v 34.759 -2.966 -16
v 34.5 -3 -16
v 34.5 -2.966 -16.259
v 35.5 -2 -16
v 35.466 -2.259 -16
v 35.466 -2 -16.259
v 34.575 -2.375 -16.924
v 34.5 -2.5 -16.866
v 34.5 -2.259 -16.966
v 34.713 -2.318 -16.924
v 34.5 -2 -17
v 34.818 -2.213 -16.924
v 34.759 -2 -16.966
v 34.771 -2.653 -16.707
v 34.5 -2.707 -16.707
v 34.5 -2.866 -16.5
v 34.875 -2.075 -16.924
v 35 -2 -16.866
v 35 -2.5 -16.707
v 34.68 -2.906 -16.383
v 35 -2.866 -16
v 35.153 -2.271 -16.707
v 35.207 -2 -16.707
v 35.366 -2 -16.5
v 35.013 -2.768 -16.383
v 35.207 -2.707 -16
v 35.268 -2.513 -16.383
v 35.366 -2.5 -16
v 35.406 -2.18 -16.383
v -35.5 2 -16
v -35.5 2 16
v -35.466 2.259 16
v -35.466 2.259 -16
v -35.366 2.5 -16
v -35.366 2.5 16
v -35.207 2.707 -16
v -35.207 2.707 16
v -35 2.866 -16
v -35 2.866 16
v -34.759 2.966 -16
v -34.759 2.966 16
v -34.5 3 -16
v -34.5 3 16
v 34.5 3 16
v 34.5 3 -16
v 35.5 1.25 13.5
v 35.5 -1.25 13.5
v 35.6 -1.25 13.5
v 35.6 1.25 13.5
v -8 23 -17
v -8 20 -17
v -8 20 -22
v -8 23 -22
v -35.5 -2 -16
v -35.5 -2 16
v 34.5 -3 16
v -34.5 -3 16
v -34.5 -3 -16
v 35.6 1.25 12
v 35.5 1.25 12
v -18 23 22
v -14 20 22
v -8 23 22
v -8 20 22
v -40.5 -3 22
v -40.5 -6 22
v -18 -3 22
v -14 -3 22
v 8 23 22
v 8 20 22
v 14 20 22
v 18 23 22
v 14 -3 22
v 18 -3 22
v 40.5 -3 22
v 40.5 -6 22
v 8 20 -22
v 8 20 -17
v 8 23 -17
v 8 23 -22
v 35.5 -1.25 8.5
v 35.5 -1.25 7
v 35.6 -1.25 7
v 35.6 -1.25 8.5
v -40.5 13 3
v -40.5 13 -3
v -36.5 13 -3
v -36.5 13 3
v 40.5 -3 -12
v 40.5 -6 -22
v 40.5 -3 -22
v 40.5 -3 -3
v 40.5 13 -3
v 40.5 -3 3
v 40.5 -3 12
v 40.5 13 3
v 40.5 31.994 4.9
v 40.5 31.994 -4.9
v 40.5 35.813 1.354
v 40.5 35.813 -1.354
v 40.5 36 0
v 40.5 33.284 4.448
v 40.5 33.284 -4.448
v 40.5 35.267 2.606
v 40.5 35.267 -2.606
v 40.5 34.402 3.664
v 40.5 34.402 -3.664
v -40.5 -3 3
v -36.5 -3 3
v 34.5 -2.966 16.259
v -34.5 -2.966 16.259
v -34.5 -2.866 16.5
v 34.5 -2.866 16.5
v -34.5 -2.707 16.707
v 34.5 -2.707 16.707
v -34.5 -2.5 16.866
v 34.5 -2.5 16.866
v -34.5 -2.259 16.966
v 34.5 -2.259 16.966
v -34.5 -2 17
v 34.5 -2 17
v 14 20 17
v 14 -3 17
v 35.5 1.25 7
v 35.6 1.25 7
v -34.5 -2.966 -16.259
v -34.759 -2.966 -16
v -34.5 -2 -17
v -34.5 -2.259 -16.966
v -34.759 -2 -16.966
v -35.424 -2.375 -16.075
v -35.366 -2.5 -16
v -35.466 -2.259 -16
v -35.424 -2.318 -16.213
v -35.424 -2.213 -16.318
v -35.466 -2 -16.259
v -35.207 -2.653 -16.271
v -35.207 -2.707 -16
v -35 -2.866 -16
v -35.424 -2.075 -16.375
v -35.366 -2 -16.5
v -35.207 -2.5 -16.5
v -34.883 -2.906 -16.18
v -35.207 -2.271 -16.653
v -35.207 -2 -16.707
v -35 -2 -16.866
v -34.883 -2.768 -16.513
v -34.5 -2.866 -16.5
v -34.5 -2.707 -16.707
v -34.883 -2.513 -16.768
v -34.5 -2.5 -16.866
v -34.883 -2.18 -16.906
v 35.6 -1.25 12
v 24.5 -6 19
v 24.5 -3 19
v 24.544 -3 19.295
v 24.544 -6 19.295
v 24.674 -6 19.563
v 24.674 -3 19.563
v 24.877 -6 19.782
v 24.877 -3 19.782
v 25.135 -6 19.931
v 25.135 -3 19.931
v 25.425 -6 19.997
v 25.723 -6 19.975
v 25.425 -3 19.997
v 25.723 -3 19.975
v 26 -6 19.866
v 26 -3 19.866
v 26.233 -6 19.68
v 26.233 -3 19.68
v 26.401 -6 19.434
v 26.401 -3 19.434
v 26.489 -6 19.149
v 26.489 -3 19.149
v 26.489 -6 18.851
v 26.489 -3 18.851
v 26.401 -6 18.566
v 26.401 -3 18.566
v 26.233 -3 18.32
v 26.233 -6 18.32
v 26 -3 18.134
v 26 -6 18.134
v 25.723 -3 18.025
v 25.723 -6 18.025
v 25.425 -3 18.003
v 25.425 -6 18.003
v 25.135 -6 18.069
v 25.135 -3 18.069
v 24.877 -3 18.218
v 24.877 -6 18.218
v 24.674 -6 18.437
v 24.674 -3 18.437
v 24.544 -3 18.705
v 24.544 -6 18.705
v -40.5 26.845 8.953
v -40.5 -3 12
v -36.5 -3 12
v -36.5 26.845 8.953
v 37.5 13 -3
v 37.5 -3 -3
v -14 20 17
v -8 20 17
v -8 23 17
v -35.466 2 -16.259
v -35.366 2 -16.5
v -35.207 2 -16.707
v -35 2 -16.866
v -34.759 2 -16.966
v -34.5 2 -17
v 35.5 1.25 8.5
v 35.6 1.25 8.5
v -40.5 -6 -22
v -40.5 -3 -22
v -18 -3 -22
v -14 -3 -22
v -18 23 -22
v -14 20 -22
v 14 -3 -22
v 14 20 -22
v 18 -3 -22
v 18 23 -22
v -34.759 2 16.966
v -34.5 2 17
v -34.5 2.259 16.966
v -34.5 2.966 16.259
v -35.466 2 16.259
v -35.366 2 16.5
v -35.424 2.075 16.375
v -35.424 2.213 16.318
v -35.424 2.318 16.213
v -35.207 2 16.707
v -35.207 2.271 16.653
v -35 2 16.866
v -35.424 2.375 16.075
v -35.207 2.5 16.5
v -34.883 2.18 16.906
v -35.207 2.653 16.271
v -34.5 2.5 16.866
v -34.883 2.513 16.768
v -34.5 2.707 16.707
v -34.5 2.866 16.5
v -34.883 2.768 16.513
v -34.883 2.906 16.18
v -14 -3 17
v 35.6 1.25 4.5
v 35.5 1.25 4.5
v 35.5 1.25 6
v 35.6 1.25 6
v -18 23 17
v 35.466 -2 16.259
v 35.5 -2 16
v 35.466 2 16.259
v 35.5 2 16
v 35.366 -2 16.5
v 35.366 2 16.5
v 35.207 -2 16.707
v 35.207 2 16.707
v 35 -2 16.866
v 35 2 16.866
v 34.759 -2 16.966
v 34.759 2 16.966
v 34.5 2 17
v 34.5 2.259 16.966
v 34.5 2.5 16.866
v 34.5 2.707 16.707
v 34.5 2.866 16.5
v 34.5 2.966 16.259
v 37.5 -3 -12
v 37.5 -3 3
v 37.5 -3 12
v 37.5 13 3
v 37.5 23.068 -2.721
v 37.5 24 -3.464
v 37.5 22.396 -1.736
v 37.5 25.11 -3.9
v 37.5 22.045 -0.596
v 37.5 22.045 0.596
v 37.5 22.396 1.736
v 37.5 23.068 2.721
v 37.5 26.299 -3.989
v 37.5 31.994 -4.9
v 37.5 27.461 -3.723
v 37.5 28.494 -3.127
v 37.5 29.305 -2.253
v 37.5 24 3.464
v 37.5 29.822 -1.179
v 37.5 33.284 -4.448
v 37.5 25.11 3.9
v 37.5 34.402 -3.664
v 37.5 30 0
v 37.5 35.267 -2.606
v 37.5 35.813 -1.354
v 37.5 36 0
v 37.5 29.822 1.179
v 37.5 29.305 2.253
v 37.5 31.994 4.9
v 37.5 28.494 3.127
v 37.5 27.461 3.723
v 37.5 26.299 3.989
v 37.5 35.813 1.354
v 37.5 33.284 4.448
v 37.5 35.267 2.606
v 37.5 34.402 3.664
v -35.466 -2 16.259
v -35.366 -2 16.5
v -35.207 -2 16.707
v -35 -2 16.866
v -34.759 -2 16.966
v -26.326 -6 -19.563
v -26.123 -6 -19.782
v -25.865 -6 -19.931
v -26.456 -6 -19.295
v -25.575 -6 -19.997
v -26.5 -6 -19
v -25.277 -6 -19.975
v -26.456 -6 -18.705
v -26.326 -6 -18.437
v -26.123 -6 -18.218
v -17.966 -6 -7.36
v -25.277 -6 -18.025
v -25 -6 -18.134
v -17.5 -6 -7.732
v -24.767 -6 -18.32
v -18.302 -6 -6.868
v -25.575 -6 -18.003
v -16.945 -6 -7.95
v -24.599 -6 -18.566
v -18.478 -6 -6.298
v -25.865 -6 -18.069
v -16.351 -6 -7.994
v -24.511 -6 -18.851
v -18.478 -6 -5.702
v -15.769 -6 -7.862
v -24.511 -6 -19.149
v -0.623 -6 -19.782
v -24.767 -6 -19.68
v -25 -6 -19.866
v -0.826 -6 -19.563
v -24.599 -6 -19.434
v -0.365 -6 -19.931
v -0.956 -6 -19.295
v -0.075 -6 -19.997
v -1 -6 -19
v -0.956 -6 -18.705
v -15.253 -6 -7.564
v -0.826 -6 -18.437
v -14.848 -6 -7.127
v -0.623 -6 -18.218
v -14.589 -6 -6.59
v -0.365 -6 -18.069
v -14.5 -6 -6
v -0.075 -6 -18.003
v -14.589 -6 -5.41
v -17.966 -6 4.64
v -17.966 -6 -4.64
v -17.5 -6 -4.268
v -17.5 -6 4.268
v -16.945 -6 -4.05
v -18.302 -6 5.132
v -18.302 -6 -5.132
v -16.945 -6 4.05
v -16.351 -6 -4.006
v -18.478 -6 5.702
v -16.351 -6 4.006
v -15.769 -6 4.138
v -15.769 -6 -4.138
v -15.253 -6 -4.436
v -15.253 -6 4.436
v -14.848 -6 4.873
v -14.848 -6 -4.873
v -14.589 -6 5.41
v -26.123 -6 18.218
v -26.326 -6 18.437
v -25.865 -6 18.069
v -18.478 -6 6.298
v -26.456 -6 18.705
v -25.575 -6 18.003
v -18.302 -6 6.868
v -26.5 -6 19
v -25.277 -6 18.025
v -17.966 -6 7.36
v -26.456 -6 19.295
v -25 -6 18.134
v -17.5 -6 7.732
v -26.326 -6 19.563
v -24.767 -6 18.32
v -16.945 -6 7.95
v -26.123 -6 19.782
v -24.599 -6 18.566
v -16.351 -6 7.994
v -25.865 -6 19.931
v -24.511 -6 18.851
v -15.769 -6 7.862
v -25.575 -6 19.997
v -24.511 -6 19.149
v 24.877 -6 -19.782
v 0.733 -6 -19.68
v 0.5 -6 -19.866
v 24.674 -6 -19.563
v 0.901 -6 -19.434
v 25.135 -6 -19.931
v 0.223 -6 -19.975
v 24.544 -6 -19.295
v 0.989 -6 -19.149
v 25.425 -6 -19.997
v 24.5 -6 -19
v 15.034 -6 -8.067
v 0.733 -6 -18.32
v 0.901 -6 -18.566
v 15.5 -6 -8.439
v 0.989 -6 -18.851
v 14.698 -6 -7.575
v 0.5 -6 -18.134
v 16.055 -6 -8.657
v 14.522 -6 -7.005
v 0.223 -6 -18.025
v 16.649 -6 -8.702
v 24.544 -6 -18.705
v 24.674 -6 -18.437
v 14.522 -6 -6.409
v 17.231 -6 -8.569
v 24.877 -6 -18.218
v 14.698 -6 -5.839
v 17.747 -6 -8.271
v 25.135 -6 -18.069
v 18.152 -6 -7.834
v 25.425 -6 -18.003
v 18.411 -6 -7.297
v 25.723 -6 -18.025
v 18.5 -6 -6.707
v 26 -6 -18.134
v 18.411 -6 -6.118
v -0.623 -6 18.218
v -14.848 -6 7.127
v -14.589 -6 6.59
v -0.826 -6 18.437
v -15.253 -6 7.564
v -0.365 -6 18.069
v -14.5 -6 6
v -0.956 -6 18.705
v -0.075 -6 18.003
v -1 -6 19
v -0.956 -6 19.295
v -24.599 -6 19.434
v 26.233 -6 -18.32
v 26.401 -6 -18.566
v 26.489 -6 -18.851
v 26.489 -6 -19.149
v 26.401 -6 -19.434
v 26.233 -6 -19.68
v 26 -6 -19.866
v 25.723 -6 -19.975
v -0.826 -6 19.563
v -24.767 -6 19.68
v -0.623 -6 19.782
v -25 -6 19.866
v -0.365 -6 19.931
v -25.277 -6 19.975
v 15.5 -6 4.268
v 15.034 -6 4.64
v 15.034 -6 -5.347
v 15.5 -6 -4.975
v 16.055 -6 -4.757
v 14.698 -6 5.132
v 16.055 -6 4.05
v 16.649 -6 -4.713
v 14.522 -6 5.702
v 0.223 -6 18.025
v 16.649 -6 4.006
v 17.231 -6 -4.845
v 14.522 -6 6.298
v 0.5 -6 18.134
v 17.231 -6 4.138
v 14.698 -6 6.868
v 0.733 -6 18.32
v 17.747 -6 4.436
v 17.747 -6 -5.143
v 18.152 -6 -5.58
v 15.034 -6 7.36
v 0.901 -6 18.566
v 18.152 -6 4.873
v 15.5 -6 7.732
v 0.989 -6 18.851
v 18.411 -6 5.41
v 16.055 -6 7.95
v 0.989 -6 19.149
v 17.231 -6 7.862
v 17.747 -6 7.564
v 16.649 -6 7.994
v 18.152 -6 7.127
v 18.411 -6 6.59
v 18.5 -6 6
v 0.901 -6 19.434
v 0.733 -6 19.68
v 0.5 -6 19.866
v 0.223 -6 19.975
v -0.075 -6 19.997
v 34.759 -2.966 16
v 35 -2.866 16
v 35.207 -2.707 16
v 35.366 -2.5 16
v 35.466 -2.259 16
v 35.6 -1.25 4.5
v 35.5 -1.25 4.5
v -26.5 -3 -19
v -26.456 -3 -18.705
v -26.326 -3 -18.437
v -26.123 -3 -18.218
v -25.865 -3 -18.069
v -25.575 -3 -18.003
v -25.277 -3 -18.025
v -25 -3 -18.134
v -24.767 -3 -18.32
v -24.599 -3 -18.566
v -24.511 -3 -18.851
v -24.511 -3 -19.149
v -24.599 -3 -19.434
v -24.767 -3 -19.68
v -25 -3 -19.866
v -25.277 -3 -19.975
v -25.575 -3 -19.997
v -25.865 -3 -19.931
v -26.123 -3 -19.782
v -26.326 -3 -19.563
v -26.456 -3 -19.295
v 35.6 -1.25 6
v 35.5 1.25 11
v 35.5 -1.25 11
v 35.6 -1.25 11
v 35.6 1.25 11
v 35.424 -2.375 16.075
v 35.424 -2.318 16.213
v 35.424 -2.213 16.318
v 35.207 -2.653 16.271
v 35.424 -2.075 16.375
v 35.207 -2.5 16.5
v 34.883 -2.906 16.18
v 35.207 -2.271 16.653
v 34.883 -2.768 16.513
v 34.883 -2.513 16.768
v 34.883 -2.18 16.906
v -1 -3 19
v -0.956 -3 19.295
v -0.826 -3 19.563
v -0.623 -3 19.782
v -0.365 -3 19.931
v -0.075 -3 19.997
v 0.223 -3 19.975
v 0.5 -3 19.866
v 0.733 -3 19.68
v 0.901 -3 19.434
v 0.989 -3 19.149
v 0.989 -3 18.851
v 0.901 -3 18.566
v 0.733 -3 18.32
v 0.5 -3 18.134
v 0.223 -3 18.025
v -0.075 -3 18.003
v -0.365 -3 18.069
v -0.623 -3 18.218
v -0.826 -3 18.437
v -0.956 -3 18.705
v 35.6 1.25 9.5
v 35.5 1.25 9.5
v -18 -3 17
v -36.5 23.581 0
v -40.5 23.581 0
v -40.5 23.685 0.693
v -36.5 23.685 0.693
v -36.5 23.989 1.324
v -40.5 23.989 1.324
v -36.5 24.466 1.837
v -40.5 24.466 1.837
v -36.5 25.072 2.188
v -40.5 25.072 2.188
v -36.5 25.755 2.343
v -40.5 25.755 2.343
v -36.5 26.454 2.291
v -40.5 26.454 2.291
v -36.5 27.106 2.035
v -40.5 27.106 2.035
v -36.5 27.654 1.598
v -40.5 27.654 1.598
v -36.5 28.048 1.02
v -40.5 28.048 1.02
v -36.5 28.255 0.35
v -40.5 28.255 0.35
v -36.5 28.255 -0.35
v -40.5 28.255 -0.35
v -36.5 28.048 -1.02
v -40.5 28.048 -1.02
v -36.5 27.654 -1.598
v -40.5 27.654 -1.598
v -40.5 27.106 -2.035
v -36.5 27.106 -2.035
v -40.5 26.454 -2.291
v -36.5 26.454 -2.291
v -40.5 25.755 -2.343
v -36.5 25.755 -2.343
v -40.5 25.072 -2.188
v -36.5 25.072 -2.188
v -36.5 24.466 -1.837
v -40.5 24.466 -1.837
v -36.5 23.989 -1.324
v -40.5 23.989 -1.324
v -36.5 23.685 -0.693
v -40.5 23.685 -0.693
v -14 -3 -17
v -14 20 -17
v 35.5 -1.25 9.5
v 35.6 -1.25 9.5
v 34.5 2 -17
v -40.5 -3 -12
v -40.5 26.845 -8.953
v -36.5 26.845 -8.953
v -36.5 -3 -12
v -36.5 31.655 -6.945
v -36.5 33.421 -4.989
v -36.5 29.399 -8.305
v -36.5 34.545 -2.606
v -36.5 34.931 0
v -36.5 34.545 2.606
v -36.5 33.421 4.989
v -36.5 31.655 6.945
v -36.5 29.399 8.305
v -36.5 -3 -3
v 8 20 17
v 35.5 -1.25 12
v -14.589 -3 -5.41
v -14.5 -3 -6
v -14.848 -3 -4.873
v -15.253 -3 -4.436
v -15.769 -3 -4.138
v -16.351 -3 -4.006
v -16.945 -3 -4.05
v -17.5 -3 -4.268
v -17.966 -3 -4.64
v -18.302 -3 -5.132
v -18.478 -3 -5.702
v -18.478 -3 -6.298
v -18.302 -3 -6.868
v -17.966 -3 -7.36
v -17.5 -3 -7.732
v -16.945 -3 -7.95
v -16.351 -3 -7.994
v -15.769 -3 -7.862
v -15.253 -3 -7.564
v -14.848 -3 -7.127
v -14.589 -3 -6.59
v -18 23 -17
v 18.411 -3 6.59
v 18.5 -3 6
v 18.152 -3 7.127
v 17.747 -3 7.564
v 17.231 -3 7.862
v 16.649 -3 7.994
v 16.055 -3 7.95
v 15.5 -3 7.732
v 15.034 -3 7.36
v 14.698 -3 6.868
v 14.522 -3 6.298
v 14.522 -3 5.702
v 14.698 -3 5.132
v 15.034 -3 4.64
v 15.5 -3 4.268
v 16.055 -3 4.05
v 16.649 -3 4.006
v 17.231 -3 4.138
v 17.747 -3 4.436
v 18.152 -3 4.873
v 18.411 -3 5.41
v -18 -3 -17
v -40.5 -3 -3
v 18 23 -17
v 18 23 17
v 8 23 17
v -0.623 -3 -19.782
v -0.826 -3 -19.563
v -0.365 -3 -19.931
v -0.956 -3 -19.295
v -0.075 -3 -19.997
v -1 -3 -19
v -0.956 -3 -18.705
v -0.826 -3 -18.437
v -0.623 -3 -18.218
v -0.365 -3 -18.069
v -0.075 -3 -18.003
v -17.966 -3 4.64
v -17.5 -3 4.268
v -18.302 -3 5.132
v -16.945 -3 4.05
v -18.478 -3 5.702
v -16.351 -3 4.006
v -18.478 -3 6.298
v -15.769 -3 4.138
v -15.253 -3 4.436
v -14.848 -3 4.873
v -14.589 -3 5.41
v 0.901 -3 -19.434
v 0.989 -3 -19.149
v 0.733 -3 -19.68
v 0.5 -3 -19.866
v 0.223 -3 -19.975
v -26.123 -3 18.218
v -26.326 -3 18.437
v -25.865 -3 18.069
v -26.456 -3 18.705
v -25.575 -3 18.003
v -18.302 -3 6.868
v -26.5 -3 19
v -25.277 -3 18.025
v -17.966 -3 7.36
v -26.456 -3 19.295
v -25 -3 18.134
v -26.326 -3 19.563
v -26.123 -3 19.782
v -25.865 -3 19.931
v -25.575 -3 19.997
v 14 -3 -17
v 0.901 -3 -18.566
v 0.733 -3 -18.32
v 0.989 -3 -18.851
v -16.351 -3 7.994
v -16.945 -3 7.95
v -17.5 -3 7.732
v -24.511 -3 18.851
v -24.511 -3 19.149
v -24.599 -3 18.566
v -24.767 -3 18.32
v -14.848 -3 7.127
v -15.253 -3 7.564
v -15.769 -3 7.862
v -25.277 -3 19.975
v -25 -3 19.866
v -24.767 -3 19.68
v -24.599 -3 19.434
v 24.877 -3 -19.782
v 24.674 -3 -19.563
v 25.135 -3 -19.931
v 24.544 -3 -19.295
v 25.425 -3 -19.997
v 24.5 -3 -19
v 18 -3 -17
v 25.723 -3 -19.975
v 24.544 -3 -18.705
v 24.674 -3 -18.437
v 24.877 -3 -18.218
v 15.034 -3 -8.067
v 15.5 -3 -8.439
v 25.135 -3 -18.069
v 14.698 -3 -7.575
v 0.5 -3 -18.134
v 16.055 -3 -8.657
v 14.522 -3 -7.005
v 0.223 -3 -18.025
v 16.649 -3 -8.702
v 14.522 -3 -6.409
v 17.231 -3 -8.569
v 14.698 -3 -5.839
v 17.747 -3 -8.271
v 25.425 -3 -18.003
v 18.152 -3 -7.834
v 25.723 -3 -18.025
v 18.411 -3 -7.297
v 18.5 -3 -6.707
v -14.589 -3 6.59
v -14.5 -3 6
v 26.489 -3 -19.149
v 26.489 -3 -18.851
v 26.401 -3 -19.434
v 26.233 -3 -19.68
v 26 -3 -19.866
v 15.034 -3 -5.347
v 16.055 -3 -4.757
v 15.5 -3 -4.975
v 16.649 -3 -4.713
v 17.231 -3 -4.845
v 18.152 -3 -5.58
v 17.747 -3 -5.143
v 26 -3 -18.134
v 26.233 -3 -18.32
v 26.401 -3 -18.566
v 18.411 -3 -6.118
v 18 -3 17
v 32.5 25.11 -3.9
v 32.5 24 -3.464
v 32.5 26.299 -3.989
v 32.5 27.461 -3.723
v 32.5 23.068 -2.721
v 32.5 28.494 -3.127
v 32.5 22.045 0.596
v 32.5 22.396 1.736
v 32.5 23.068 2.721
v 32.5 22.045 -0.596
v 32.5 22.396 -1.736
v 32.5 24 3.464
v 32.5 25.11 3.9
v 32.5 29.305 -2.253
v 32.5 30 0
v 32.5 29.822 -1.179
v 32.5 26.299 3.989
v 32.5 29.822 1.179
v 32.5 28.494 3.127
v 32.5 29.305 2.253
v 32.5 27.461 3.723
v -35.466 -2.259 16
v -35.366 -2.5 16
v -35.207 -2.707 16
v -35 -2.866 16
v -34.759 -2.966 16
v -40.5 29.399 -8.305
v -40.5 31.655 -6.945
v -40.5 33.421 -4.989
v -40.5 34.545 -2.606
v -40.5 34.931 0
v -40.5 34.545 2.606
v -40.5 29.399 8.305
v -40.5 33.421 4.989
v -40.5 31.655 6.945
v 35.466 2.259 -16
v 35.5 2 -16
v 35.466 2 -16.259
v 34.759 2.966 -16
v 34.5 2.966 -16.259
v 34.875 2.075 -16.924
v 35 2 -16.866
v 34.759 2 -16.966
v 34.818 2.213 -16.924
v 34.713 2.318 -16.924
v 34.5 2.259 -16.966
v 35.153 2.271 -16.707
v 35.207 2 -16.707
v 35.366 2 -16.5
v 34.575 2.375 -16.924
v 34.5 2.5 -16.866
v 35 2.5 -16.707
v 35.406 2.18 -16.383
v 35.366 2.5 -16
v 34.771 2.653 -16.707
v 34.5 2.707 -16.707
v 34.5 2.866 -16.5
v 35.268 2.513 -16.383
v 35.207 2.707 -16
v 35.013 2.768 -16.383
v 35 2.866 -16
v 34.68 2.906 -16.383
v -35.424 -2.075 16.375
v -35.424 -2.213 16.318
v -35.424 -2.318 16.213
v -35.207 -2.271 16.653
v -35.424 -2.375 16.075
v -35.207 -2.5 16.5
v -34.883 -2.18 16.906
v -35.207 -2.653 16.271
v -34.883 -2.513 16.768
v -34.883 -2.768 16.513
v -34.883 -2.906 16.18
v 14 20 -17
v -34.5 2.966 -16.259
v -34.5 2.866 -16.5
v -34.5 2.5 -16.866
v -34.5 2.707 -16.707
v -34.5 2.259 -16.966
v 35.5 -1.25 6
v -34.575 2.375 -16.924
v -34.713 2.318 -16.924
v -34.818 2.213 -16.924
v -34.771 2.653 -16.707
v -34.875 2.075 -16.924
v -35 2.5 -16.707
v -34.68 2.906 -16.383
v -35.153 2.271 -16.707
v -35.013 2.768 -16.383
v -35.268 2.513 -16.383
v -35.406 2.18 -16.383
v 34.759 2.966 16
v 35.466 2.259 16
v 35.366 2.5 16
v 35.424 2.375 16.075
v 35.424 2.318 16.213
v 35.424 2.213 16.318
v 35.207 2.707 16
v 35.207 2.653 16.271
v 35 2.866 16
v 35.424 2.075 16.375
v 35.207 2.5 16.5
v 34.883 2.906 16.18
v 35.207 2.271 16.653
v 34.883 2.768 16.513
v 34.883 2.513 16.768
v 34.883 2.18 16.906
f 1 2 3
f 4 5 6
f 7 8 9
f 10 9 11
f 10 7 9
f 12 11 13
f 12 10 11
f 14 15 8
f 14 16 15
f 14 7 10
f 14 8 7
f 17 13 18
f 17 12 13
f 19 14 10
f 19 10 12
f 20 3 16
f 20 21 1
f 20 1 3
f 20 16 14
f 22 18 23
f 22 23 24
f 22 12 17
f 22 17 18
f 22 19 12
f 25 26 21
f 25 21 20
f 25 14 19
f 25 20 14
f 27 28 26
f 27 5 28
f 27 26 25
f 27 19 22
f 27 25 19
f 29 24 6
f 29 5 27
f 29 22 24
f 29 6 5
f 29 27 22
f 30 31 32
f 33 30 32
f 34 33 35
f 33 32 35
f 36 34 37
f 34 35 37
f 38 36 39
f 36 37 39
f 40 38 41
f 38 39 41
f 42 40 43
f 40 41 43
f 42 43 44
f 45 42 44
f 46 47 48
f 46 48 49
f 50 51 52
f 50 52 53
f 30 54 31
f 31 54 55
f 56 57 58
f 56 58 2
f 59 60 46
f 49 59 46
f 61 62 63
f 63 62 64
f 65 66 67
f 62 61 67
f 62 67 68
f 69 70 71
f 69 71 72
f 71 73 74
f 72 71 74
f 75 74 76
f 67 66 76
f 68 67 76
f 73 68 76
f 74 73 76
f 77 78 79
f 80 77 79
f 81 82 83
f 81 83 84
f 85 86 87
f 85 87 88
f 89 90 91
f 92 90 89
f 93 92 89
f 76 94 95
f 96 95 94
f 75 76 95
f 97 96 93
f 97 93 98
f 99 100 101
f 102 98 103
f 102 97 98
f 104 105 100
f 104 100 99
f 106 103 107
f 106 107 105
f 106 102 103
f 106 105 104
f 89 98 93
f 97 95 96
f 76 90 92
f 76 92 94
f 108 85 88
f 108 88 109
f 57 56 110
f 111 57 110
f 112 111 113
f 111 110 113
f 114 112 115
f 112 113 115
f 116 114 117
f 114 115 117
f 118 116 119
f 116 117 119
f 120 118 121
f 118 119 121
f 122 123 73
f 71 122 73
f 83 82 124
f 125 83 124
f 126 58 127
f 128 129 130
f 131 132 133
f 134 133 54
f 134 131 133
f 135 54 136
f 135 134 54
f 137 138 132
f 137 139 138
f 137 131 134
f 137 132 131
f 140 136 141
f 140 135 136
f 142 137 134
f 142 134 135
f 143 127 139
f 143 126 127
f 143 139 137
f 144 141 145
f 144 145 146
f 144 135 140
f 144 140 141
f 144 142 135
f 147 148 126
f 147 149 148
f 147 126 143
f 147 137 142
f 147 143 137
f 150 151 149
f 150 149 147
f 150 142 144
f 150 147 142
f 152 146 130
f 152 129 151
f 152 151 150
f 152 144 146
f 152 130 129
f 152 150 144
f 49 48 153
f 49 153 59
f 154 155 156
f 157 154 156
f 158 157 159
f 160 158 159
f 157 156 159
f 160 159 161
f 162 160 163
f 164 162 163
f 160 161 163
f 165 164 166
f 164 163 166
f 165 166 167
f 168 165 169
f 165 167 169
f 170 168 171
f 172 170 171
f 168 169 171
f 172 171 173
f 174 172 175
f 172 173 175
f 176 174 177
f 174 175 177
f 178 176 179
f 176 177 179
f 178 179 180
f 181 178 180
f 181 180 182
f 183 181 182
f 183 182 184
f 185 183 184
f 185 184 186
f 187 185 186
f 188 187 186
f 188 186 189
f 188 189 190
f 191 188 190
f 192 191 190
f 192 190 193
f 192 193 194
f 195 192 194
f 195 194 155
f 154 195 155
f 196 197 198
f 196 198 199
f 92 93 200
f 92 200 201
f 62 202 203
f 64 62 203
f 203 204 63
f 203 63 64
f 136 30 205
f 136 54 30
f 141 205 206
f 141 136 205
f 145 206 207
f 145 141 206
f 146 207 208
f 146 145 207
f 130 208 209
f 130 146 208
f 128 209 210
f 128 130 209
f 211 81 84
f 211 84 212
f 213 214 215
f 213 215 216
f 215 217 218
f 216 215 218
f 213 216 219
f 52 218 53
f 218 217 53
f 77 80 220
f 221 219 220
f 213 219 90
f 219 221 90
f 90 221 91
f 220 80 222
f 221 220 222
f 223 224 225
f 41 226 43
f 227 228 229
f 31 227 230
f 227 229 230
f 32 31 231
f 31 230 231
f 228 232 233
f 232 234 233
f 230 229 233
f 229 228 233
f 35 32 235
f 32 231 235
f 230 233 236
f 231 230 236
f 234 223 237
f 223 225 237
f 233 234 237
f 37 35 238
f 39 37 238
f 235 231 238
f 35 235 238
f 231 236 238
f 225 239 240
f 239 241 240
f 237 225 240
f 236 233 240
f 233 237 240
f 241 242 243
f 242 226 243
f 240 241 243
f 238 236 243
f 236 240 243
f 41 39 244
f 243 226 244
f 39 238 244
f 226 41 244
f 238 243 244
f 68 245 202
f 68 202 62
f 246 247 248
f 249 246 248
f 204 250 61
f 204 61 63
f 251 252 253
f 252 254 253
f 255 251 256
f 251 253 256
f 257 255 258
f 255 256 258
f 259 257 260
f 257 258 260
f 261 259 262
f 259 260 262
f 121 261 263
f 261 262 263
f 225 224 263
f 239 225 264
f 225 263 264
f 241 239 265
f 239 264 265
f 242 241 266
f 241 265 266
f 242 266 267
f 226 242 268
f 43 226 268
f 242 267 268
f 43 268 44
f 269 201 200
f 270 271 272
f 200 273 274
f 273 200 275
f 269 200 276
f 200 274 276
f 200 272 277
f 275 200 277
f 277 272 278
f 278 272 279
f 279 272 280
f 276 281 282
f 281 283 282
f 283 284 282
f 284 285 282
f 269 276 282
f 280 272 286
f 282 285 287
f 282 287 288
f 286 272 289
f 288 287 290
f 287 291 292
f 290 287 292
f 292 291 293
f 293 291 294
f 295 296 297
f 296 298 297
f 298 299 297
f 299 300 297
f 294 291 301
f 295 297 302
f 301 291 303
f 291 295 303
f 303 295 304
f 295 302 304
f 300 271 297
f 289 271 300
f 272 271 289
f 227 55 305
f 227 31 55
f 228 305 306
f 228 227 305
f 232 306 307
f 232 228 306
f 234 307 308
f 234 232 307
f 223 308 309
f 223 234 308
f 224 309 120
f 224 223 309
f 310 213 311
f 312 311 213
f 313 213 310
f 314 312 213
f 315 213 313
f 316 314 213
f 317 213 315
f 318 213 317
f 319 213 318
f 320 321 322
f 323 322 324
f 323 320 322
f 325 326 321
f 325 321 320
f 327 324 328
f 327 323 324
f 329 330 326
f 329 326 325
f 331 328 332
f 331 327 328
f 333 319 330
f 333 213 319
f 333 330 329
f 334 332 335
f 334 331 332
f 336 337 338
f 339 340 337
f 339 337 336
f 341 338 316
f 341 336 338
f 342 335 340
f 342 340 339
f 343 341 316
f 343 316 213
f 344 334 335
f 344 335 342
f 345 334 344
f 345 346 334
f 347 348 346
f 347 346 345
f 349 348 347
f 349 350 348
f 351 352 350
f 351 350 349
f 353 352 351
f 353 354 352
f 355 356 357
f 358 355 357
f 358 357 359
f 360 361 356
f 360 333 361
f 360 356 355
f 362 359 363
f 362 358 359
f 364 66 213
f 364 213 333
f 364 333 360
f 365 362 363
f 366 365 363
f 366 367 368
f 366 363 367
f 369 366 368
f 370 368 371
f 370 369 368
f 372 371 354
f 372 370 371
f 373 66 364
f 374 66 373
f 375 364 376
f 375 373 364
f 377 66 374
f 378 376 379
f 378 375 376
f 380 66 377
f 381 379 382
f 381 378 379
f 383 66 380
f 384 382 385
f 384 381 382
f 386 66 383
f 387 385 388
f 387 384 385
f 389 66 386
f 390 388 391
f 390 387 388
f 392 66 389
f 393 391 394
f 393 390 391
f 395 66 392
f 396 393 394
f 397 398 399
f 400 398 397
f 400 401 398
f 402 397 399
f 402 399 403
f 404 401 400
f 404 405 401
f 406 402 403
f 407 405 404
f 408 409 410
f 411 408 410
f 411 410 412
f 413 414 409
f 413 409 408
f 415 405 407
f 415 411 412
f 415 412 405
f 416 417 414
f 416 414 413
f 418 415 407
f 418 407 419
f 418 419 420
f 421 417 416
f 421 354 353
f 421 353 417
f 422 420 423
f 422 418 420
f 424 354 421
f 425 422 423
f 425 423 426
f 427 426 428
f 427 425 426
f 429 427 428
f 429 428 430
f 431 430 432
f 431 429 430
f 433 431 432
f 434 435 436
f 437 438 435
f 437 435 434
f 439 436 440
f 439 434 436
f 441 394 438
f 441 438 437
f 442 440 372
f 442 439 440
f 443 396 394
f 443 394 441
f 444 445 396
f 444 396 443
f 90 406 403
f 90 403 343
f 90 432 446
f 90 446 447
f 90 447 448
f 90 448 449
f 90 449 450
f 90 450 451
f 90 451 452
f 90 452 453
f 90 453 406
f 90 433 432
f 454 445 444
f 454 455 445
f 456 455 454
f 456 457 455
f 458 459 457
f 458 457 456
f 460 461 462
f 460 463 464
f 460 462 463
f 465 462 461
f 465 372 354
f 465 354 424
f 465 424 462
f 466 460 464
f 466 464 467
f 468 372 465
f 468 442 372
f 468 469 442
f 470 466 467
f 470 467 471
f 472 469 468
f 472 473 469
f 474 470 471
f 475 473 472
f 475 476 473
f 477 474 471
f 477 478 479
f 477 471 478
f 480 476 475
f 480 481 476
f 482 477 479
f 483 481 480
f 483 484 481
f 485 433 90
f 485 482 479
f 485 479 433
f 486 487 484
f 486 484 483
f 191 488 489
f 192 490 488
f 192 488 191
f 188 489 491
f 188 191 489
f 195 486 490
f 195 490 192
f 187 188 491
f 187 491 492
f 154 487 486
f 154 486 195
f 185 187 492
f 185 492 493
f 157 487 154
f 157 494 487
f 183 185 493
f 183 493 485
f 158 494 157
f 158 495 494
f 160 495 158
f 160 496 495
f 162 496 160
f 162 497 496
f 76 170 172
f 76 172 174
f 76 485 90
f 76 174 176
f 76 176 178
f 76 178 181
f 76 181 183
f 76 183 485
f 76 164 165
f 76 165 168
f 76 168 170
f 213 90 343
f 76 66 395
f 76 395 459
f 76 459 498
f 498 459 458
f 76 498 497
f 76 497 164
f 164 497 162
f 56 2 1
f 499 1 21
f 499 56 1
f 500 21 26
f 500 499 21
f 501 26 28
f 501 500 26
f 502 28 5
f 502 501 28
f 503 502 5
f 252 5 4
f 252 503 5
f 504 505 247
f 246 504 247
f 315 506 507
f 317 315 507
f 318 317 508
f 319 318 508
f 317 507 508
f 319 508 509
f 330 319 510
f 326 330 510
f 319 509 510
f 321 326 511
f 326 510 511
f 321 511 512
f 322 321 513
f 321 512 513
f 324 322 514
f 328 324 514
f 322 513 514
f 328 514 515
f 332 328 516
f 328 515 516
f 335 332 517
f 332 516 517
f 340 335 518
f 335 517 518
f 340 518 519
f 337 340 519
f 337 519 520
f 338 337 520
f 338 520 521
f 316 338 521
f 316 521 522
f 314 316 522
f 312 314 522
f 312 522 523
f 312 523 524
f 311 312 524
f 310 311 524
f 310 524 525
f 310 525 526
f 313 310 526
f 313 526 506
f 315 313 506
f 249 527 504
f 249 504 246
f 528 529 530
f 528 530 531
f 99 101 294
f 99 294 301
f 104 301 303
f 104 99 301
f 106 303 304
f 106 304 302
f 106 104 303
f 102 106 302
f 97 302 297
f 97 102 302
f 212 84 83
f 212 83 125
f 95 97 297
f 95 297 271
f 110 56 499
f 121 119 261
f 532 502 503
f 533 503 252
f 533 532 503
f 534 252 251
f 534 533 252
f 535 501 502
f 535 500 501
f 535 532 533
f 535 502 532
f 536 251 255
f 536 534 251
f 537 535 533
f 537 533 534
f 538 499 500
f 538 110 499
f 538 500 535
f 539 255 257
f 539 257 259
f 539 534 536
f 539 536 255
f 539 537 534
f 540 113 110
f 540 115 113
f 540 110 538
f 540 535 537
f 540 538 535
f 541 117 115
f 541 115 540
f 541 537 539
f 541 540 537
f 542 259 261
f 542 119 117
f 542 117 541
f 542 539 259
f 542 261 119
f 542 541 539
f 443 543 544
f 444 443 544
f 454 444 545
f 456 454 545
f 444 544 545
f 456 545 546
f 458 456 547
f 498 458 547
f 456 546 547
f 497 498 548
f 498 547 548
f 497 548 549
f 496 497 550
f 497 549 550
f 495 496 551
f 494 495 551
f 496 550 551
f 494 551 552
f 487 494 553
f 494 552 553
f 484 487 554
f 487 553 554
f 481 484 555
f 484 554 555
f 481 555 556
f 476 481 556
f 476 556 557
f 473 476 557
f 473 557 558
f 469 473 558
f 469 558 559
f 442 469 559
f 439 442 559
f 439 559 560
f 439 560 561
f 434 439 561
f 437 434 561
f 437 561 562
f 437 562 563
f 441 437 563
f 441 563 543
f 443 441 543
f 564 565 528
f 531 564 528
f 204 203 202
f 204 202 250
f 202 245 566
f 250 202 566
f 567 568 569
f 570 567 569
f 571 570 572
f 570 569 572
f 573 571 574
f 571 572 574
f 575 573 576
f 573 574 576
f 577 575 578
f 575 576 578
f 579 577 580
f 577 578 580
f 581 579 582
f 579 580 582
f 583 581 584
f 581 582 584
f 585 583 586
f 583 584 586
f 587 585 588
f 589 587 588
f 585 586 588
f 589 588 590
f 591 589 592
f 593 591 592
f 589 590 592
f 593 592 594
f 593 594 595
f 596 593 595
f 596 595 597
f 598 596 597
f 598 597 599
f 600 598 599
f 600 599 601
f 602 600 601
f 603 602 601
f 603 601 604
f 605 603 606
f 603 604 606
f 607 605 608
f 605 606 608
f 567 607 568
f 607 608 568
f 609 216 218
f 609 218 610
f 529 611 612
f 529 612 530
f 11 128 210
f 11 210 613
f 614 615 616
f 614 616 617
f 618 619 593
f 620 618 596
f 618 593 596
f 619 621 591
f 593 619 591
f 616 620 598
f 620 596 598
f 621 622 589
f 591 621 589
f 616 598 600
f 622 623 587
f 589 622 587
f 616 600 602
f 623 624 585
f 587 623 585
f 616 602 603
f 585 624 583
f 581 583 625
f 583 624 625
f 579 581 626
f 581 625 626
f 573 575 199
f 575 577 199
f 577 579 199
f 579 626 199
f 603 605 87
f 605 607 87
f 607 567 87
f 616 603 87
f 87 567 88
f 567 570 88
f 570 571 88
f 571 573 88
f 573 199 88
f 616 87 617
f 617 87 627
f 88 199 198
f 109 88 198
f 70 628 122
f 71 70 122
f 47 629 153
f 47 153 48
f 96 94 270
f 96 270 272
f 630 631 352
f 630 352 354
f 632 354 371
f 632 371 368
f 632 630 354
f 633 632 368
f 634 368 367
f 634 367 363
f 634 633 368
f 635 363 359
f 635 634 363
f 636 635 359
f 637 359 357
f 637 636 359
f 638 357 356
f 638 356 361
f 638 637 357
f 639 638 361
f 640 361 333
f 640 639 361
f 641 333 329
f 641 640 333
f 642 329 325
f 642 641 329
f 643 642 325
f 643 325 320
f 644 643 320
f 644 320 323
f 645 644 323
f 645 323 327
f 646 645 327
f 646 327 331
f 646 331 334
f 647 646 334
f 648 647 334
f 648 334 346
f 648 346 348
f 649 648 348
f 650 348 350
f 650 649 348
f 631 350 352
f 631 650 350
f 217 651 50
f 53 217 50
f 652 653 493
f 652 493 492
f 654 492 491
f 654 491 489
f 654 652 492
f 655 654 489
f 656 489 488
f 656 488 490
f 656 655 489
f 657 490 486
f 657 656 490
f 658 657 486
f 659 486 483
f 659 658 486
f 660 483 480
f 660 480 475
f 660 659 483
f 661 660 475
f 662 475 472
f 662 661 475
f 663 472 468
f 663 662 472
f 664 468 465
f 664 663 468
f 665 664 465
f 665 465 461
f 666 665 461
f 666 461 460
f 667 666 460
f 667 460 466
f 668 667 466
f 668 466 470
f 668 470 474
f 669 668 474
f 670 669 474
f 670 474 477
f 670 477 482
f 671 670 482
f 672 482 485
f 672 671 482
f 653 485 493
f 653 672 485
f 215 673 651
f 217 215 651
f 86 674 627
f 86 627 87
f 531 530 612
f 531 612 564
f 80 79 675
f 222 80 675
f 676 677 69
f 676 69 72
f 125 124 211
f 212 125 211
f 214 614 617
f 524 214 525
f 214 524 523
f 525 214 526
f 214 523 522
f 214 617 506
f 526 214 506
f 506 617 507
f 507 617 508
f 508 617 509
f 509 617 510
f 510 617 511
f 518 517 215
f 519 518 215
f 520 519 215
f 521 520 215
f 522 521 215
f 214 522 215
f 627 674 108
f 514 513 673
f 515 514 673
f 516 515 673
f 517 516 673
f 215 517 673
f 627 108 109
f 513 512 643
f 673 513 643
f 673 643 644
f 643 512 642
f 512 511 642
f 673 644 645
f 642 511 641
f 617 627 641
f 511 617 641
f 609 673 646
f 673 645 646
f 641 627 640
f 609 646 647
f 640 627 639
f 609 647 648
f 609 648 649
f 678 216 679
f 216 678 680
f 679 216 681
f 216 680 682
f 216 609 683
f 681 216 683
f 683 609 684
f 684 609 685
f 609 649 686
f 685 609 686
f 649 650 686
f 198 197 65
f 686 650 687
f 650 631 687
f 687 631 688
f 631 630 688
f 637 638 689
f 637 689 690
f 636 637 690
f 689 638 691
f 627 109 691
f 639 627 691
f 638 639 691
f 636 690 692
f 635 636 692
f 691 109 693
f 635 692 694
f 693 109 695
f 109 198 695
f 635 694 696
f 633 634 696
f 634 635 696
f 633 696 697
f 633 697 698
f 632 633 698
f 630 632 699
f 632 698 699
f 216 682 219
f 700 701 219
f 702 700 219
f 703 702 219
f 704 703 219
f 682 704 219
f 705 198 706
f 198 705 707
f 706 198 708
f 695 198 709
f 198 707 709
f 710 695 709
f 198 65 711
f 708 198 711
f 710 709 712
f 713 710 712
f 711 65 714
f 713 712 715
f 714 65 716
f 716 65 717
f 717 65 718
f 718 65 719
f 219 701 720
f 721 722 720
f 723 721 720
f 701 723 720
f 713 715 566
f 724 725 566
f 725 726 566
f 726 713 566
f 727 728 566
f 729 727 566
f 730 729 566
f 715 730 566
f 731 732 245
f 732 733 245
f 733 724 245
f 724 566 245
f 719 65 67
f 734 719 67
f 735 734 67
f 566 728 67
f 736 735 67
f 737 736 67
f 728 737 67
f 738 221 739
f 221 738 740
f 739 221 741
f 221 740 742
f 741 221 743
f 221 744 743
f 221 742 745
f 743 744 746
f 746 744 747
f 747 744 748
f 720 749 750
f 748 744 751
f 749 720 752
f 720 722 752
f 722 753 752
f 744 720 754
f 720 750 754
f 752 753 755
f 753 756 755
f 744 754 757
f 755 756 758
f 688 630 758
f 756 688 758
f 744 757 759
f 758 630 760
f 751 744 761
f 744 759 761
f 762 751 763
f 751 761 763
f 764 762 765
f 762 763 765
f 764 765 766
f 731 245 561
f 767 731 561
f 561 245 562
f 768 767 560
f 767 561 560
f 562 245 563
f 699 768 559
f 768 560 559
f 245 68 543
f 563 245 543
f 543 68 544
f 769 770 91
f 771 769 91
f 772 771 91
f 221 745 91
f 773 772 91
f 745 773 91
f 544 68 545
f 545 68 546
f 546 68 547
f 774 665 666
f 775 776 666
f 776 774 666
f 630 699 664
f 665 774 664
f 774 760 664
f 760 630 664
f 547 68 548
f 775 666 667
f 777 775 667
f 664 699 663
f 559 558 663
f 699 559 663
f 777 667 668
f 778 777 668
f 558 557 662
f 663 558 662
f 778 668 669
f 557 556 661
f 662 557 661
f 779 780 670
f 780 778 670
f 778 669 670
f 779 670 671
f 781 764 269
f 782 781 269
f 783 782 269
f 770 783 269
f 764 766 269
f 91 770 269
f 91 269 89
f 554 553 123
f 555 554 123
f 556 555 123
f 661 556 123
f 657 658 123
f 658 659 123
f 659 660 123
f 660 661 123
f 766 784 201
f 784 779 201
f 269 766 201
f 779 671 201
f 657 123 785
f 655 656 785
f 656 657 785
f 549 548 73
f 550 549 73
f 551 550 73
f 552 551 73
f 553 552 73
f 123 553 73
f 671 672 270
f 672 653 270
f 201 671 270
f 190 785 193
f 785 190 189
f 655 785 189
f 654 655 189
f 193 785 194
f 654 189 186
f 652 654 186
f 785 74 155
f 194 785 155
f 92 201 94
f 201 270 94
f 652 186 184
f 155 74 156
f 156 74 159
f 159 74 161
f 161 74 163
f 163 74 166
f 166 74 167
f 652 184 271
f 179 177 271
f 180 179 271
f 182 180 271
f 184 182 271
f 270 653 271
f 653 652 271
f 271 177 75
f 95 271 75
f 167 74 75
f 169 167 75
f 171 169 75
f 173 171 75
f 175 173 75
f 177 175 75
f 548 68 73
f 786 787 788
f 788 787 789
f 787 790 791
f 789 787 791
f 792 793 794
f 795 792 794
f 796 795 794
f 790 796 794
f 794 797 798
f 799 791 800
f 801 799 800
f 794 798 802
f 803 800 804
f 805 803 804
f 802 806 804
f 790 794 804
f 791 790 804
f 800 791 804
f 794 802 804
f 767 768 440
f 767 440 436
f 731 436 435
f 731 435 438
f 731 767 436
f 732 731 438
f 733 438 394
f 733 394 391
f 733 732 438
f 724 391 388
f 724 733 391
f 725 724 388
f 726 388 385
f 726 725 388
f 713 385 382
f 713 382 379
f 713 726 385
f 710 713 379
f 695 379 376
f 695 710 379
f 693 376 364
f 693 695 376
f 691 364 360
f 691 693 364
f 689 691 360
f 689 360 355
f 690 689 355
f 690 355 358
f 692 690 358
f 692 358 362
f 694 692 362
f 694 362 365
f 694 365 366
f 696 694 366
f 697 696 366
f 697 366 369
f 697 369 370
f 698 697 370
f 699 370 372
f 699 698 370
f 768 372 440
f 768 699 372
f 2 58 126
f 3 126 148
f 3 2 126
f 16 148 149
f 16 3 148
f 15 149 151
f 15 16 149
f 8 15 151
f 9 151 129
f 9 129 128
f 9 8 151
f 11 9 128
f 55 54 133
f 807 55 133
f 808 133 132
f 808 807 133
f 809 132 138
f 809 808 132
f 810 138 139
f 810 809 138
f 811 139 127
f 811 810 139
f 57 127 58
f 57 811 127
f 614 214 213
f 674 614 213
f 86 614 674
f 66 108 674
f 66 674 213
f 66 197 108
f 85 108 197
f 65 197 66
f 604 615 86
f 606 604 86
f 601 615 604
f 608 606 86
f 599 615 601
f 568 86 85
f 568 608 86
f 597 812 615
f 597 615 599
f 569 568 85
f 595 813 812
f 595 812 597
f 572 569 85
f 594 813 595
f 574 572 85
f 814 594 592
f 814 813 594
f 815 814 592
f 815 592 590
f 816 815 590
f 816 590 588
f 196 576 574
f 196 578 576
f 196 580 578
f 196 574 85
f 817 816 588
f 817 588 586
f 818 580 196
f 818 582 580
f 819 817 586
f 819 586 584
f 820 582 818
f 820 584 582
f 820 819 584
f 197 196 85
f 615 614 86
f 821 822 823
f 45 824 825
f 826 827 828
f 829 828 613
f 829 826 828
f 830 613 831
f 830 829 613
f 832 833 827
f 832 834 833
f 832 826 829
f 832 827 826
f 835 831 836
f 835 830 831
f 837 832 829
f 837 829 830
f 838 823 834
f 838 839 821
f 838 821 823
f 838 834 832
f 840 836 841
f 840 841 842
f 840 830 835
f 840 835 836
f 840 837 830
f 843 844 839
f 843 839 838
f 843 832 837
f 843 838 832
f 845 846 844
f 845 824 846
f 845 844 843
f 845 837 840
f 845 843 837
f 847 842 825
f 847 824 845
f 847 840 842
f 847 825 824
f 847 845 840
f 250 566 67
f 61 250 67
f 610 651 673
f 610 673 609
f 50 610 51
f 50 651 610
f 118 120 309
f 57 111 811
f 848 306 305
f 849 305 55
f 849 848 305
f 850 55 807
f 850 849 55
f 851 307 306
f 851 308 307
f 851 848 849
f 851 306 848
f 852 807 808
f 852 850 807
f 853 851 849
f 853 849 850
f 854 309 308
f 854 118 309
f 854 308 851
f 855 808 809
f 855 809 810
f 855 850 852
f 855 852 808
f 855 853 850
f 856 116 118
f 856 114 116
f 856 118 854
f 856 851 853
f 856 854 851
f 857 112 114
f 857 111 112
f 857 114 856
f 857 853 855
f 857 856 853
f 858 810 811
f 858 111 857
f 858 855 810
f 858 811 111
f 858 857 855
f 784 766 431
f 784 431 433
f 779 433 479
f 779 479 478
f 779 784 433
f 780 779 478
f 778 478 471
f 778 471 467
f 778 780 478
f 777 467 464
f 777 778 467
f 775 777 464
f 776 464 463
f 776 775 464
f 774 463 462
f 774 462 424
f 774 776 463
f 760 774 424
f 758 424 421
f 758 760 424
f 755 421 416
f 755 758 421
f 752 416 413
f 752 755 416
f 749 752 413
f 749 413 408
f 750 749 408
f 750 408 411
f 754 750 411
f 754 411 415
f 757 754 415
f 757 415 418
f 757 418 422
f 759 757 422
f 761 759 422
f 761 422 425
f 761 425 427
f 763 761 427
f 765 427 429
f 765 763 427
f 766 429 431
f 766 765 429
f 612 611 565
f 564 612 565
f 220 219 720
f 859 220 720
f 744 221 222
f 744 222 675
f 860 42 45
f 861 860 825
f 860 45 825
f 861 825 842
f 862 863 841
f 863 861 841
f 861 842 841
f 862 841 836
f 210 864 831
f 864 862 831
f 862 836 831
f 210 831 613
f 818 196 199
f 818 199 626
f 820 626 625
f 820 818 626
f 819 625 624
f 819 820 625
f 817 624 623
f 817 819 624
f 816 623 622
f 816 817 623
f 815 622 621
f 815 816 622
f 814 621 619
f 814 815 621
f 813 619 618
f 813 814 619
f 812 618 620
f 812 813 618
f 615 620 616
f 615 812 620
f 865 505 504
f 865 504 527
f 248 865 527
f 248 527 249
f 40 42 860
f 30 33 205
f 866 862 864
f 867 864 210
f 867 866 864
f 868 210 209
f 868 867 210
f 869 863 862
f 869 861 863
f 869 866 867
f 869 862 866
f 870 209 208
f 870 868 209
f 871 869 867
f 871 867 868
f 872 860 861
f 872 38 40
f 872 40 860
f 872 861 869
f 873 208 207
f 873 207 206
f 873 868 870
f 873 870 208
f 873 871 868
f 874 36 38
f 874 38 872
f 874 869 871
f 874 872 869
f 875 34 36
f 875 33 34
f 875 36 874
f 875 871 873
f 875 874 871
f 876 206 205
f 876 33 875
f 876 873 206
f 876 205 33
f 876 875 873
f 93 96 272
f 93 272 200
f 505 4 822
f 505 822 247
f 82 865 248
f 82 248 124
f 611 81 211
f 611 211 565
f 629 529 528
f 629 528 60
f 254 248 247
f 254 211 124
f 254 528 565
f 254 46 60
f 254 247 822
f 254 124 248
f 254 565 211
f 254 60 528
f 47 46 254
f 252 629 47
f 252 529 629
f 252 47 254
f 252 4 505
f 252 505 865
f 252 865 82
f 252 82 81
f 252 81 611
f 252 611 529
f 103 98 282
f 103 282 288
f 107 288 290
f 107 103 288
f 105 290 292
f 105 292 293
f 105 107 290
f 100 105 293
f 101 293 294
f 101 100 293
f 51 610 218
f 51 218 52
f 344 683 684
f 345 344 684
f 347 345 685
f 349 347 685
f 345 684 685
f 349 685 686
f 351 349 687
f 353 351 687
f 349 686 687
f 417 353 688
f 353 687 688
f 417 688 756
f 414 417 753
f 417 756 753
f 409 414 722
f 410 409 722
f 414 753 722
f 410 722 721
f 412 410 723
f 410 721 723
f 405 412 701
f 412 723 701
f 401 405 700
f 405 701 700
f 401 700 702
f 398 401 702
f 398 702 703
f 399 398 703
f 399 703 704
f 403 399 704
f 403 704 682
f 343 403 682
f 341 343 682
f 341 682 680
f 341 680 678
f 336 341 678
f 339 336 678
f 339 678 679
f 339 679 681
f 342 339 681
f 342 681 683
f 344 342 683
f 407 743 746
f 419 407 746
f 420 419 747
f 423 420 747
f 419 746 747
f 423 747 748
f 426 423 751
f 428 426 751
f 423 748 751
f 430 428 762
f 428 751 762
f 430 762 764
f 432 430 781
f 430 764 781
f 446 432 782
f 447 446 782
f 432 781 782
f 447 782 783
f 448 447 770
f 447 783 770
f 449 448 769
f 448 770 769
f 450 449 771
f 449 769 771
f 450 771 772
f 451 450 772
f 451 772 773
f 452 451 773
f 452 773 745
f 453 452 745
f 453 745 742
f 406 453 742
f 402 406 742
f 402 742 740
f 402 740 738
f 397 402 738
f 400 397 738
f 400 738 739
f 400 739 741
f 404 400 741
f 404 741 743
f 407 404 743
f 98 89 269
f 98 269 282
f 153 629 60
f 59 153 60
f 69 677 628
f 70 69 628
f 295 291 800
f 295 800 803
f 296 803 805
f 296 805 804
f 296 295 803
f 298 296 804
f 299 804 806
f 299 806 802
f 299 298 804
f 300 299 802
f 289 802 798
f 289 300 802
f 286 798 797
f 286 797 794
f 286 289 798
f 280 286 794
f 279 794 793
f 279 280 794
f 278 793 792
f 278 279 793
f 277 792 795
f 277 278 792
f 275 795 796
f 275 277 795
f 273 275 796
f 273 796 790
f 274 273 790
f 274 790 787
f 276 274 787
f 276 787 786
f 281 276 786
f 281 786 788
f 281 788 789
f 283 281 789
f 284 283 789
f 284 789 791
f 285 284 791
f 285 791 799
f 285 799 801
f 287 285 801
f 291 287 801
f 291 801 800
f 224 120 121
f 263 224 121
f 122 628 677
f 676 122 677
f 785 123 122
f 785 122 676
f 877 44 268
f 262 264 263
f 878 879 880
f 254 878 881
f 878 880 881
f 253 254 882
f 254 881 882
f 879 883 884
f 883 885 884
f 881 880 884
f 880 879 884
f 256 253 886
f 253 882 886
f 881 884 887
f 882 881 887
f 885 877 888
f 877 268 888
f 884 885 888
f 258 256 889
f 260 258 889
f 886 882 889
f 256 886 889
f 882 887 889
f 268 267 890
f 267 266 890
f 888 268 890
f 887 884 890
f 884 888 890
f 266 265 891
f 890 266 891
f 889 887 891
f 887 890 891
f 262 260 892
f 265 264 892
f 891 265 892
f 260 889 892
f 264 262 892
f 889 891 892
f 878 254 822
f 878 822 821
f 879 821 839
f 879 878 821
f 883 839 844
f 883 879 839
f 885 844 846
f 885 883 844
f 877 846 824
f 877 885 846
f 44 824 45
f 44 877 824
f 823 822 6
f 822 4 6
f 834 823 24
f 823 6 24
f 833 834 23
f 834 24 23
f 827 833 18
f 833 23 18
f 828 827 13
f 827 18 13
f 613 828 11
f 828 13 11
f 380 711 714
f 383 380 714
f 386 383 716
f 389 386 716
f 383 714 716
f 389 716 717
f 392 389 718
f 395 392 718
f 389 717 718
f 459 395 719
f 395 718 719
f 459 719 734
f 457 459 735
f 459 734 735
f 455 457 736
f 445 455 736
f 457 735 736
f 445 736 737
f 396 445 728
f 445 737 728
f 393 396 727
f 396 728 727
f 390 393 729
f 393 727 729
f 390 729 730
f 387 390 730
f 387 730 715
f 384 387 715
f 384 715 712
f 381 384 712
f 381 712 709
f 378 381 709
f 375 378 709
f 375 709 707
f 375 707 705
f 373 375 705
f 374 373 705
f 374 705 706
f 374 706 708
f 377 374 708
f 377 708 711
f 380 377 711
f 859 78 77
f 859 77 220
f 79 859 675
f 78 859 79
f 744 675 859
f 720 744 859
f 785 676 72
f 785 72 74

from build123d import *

# Parameters (mm, degrees)
F0_W      = 71
F0_H      = 34
F1_DEPTH  = 3
F2_R      = 1
F3_W      = 2.5
F3_H      = 1.5
F4_DEPTH  = 0.1
F5_W      = 80.9999997616
F5_H      = 43.9999997616
F5_R      = 2
F6_DEPTH  = 3
F7_R      = 2.35
F8_DEPTH  = 4
F10_DEPTH = 3
F11_R     = 4
F12_DEPTH = 8
F13_W     = 4
F13_H     = 5
F14_DEPTH = 23
F15_W     = 10
F15_H     = 3
F16_DEPTH = 5
F17_R     = 1
F18_DEPTH = 25
F19_W     = 10
F19_H     = 3
F20_DEPTH = 5


with BuildPart() as f1:
    # F0 (on Front) → F1 (new body, symmetric)
    with BuildSketch(Plane.XZ):
        Rectangle(F0_W, F0_H)
    extrude(amount=F1_DEPTH, both=True)

    # F2
    f2_edges = [f1.edges().sort_by_distance(p)[0] for p in [
        (0, -3, 17),
        (0, 3, 17),
        (35.5, -3, 0),
        (35.5, 3, 0),
        (0, -3, -17),
        (35.5, 0, -17),
        (-35.5, 0, 17),
        (-35.5, -3, 0),
        (-35.5, 3, 0),
        (0, 3, -17),
        (-35.5, 0, -17),
        (35.5, 0, 17),
    ]]
    fillet(f2_edges, radius=F2_R)

    # F3 (on face) → F4 (join)
    with BuildSketch(Plane.YZ.offset(35.5)):
        with Locations((0, 12.75)):
            Rectangle(F3_W, F3_H)
        with Locations((0, 10.25)):
            Rectangle(F3_W, F3_H)
        with Locations((0, 7.75)):
            Rectangle(F3_W, F3_H)
        with Locations((0, 5.25)):
            Rectangle(F3_W, F3_H)
    extrude(amount=F4_DEPTH)


with BuildPart() as f6:
    # F5 (on face) → F6 (new body)
    with BuildSketch(Plane.XZ.offset(3)):
        Rectangle(F5_W, F5_H)
        with Locations((-16.5, -6)):
            Circle(F5_R, mode=Mode.SUBTRACT)
        with Locations((16.5, -6.7071067812)):
            Circle(F5_R, mode=Mode.SUBTRACT)
        with Locations((-16.5, 6)):
            Circle(F5_R, mode=Mode.SUBTRACT)
        with Locations((16.5, 6)):
            Circle(F5_R, mode=Mode.SUBTRACT)
    extrude(amount=F6_DEPTH)

    # F7 (on face) → F8 (join)
    with BuildSketch(Plane(origin=(-40.4999998808, 0, 0), x_dir=(0, -1, 0), z_dir=(-1, 0, 0))):
        with BuildLine():
            ThreePointArc((-26.8449103639, -8.9534731092), (-19.8987728873, -6.6792822325), (-16.9309523324, 0))
            ThreePointArc((-16.9309523324, 0), (-19.8987728873, 6.6792822325), (-26.8449103639, 8.9534731092))
            ThreePointArc((-26.8449103639, 8.9534731092), (-34.9309523324, 0), (-26.8449103639, -8.9534731092))
        make_face()
        with Locations((-25.9309523324, 0)):
            Circle(F7_R, mode=Mode.SUBTRACT)
        with BuildLine():
            ThreePointArc((-26.8449103639, 8.9534731092), (-19.8987728873, 6.6792822325), (-16.9309523324, 0))
            ThreePointArc((-16.9309523324, 0), (-19.8987728873, -6.6792822325), (-26.8449103639, -8.9534731092))
            Line((-26.8449103639, -8.9534731092), (3, -11.9999998808))
            Line((3, -11.9999998808), (3, -3))
            Line((3, -3), (-13, -3))
            Line((-13, -3), (-13, 3))
            Line((-13, 3), (3, 3))
            Line((3, 3), (3, 11.9999998808))
            Line((3, 11.9999998808), (-26.8449103639, 8.9534731092))
        make_face()
    extrude(amount=-F8_DEPTH)

    # F9 (on face) → F10 (join)
    with BuildSketch(Plane.YZ.offset(40.4999998808)):
        with BuildLine():
            ThreePointArc((31.9941757912, -4.9001647417), (34.8711031345, -3.1645790434), (36, 0))
            ThreePointArc((36, 0), (34.8711031345, 3.1645790434), (31.9941757912, 4.9001647417))
            ThreePointArc((31.9941757912, 4.9001647417), (26, 0), (31.9941757912, -4.9001647417))
        make_face()
        with BuildLine():
            ThreePointArc((31.9941757912, -4.9001647417), (26, 0), (31.9941757912, 4.9001647417))
            Line((31.9941757912, 4.9001647417), (-3, 12))
            Line((-3, 12), (-3, 3))
            Line((-3, 3), (13, 3))
            Line((13, 3), (13, -3))
            Line((13, -3), (-3, -3))
            Line((-3, -3), (-3, -12))
            Line((-3, -12), (31.9941757912, -4.9001647417))
        make_face()
    extrude(amount=-F10_DEPTH)

    # F11 (on face) → F12 (join)
    with BuildSketch(Plane.YZ.offset(40.4999998808)):
        with Locations((26, 0)):
            Circle(F11_R)
    extrude(amount=-F12_DEPTH)

    # F13 (on face) → F14 (join)
    with BuildSketch(Plane(origin=(0, -3, 0), x_dir=(-1, 0, 0), z_dir=(0, 1, 0))):
        with Locations((16, 19.4999998808)):
            Rectangle(F13_W, F13_H)
        with Locations((-16, 19.4999998808)):
            Rectangle(F13_W, F13_H)
        with Locations((16, -19.4999998808)):
            Rectangle(F13_W, F13_H)
        with Locations((-16, -19.4999998808)):
            Rectangle(F13_W, F13_H)
    extrude(amount=F14_DEPTH)

    # F15 (on face) → F16 (join)
    with BuildSketch(Plane(origin=(0, 0, 16.9999998808), x_dir=(1, 0, 0), z_dir=(0, 0, -1))):
        with Locations((13, -21.5)):
            Rectangle(F15_W, F15_H)
        with Locations((-13, -21.5)):
            Rectangle(F15_W, F15_H)
    extrude(amount=-F16_DEPTH)

    # F17 (on face) → F18 (cut)
    with BuildSketch(Plane(origin=(0, -3, 0), x_dir=(-1, 0, 0), z_dir=(0, 1, 0))):
        with Locations((25.4999998808, 18.9999998808)):
            Circle(F17_R)
        with Locations((25.4999998808, -18.9999998808)):
            Circle(F17_R)
        with Locations((-25.4999998808, 18.9999998808)):
            Circle(F17_R)
        with Locations((-25.4999998808, -18.9999998808)):
            Circle(F17_R)
        with Locations((0, -18.9999998808)):
            Circle(F17_R)
        with Locations((0, 18.9999998808)):
            Circle(F17_R)
    extrude(amount=-F18_DEPTH, mode=Mode.SUBTRACT)

    # F19 (on face) → F20 (join)
    with BuildSketch(Plane.XY.offset(-16.9999998808)):
        with Locations((-13, 21.5)):
            Rectangle(F19_W, F19_H)
        with Locations((13, 21.5)):
            Rectangle(F19_W, F19_H)
    extrude(amount=-F20_DEPTH)


solid = Compound([f1.part, f6.part])
